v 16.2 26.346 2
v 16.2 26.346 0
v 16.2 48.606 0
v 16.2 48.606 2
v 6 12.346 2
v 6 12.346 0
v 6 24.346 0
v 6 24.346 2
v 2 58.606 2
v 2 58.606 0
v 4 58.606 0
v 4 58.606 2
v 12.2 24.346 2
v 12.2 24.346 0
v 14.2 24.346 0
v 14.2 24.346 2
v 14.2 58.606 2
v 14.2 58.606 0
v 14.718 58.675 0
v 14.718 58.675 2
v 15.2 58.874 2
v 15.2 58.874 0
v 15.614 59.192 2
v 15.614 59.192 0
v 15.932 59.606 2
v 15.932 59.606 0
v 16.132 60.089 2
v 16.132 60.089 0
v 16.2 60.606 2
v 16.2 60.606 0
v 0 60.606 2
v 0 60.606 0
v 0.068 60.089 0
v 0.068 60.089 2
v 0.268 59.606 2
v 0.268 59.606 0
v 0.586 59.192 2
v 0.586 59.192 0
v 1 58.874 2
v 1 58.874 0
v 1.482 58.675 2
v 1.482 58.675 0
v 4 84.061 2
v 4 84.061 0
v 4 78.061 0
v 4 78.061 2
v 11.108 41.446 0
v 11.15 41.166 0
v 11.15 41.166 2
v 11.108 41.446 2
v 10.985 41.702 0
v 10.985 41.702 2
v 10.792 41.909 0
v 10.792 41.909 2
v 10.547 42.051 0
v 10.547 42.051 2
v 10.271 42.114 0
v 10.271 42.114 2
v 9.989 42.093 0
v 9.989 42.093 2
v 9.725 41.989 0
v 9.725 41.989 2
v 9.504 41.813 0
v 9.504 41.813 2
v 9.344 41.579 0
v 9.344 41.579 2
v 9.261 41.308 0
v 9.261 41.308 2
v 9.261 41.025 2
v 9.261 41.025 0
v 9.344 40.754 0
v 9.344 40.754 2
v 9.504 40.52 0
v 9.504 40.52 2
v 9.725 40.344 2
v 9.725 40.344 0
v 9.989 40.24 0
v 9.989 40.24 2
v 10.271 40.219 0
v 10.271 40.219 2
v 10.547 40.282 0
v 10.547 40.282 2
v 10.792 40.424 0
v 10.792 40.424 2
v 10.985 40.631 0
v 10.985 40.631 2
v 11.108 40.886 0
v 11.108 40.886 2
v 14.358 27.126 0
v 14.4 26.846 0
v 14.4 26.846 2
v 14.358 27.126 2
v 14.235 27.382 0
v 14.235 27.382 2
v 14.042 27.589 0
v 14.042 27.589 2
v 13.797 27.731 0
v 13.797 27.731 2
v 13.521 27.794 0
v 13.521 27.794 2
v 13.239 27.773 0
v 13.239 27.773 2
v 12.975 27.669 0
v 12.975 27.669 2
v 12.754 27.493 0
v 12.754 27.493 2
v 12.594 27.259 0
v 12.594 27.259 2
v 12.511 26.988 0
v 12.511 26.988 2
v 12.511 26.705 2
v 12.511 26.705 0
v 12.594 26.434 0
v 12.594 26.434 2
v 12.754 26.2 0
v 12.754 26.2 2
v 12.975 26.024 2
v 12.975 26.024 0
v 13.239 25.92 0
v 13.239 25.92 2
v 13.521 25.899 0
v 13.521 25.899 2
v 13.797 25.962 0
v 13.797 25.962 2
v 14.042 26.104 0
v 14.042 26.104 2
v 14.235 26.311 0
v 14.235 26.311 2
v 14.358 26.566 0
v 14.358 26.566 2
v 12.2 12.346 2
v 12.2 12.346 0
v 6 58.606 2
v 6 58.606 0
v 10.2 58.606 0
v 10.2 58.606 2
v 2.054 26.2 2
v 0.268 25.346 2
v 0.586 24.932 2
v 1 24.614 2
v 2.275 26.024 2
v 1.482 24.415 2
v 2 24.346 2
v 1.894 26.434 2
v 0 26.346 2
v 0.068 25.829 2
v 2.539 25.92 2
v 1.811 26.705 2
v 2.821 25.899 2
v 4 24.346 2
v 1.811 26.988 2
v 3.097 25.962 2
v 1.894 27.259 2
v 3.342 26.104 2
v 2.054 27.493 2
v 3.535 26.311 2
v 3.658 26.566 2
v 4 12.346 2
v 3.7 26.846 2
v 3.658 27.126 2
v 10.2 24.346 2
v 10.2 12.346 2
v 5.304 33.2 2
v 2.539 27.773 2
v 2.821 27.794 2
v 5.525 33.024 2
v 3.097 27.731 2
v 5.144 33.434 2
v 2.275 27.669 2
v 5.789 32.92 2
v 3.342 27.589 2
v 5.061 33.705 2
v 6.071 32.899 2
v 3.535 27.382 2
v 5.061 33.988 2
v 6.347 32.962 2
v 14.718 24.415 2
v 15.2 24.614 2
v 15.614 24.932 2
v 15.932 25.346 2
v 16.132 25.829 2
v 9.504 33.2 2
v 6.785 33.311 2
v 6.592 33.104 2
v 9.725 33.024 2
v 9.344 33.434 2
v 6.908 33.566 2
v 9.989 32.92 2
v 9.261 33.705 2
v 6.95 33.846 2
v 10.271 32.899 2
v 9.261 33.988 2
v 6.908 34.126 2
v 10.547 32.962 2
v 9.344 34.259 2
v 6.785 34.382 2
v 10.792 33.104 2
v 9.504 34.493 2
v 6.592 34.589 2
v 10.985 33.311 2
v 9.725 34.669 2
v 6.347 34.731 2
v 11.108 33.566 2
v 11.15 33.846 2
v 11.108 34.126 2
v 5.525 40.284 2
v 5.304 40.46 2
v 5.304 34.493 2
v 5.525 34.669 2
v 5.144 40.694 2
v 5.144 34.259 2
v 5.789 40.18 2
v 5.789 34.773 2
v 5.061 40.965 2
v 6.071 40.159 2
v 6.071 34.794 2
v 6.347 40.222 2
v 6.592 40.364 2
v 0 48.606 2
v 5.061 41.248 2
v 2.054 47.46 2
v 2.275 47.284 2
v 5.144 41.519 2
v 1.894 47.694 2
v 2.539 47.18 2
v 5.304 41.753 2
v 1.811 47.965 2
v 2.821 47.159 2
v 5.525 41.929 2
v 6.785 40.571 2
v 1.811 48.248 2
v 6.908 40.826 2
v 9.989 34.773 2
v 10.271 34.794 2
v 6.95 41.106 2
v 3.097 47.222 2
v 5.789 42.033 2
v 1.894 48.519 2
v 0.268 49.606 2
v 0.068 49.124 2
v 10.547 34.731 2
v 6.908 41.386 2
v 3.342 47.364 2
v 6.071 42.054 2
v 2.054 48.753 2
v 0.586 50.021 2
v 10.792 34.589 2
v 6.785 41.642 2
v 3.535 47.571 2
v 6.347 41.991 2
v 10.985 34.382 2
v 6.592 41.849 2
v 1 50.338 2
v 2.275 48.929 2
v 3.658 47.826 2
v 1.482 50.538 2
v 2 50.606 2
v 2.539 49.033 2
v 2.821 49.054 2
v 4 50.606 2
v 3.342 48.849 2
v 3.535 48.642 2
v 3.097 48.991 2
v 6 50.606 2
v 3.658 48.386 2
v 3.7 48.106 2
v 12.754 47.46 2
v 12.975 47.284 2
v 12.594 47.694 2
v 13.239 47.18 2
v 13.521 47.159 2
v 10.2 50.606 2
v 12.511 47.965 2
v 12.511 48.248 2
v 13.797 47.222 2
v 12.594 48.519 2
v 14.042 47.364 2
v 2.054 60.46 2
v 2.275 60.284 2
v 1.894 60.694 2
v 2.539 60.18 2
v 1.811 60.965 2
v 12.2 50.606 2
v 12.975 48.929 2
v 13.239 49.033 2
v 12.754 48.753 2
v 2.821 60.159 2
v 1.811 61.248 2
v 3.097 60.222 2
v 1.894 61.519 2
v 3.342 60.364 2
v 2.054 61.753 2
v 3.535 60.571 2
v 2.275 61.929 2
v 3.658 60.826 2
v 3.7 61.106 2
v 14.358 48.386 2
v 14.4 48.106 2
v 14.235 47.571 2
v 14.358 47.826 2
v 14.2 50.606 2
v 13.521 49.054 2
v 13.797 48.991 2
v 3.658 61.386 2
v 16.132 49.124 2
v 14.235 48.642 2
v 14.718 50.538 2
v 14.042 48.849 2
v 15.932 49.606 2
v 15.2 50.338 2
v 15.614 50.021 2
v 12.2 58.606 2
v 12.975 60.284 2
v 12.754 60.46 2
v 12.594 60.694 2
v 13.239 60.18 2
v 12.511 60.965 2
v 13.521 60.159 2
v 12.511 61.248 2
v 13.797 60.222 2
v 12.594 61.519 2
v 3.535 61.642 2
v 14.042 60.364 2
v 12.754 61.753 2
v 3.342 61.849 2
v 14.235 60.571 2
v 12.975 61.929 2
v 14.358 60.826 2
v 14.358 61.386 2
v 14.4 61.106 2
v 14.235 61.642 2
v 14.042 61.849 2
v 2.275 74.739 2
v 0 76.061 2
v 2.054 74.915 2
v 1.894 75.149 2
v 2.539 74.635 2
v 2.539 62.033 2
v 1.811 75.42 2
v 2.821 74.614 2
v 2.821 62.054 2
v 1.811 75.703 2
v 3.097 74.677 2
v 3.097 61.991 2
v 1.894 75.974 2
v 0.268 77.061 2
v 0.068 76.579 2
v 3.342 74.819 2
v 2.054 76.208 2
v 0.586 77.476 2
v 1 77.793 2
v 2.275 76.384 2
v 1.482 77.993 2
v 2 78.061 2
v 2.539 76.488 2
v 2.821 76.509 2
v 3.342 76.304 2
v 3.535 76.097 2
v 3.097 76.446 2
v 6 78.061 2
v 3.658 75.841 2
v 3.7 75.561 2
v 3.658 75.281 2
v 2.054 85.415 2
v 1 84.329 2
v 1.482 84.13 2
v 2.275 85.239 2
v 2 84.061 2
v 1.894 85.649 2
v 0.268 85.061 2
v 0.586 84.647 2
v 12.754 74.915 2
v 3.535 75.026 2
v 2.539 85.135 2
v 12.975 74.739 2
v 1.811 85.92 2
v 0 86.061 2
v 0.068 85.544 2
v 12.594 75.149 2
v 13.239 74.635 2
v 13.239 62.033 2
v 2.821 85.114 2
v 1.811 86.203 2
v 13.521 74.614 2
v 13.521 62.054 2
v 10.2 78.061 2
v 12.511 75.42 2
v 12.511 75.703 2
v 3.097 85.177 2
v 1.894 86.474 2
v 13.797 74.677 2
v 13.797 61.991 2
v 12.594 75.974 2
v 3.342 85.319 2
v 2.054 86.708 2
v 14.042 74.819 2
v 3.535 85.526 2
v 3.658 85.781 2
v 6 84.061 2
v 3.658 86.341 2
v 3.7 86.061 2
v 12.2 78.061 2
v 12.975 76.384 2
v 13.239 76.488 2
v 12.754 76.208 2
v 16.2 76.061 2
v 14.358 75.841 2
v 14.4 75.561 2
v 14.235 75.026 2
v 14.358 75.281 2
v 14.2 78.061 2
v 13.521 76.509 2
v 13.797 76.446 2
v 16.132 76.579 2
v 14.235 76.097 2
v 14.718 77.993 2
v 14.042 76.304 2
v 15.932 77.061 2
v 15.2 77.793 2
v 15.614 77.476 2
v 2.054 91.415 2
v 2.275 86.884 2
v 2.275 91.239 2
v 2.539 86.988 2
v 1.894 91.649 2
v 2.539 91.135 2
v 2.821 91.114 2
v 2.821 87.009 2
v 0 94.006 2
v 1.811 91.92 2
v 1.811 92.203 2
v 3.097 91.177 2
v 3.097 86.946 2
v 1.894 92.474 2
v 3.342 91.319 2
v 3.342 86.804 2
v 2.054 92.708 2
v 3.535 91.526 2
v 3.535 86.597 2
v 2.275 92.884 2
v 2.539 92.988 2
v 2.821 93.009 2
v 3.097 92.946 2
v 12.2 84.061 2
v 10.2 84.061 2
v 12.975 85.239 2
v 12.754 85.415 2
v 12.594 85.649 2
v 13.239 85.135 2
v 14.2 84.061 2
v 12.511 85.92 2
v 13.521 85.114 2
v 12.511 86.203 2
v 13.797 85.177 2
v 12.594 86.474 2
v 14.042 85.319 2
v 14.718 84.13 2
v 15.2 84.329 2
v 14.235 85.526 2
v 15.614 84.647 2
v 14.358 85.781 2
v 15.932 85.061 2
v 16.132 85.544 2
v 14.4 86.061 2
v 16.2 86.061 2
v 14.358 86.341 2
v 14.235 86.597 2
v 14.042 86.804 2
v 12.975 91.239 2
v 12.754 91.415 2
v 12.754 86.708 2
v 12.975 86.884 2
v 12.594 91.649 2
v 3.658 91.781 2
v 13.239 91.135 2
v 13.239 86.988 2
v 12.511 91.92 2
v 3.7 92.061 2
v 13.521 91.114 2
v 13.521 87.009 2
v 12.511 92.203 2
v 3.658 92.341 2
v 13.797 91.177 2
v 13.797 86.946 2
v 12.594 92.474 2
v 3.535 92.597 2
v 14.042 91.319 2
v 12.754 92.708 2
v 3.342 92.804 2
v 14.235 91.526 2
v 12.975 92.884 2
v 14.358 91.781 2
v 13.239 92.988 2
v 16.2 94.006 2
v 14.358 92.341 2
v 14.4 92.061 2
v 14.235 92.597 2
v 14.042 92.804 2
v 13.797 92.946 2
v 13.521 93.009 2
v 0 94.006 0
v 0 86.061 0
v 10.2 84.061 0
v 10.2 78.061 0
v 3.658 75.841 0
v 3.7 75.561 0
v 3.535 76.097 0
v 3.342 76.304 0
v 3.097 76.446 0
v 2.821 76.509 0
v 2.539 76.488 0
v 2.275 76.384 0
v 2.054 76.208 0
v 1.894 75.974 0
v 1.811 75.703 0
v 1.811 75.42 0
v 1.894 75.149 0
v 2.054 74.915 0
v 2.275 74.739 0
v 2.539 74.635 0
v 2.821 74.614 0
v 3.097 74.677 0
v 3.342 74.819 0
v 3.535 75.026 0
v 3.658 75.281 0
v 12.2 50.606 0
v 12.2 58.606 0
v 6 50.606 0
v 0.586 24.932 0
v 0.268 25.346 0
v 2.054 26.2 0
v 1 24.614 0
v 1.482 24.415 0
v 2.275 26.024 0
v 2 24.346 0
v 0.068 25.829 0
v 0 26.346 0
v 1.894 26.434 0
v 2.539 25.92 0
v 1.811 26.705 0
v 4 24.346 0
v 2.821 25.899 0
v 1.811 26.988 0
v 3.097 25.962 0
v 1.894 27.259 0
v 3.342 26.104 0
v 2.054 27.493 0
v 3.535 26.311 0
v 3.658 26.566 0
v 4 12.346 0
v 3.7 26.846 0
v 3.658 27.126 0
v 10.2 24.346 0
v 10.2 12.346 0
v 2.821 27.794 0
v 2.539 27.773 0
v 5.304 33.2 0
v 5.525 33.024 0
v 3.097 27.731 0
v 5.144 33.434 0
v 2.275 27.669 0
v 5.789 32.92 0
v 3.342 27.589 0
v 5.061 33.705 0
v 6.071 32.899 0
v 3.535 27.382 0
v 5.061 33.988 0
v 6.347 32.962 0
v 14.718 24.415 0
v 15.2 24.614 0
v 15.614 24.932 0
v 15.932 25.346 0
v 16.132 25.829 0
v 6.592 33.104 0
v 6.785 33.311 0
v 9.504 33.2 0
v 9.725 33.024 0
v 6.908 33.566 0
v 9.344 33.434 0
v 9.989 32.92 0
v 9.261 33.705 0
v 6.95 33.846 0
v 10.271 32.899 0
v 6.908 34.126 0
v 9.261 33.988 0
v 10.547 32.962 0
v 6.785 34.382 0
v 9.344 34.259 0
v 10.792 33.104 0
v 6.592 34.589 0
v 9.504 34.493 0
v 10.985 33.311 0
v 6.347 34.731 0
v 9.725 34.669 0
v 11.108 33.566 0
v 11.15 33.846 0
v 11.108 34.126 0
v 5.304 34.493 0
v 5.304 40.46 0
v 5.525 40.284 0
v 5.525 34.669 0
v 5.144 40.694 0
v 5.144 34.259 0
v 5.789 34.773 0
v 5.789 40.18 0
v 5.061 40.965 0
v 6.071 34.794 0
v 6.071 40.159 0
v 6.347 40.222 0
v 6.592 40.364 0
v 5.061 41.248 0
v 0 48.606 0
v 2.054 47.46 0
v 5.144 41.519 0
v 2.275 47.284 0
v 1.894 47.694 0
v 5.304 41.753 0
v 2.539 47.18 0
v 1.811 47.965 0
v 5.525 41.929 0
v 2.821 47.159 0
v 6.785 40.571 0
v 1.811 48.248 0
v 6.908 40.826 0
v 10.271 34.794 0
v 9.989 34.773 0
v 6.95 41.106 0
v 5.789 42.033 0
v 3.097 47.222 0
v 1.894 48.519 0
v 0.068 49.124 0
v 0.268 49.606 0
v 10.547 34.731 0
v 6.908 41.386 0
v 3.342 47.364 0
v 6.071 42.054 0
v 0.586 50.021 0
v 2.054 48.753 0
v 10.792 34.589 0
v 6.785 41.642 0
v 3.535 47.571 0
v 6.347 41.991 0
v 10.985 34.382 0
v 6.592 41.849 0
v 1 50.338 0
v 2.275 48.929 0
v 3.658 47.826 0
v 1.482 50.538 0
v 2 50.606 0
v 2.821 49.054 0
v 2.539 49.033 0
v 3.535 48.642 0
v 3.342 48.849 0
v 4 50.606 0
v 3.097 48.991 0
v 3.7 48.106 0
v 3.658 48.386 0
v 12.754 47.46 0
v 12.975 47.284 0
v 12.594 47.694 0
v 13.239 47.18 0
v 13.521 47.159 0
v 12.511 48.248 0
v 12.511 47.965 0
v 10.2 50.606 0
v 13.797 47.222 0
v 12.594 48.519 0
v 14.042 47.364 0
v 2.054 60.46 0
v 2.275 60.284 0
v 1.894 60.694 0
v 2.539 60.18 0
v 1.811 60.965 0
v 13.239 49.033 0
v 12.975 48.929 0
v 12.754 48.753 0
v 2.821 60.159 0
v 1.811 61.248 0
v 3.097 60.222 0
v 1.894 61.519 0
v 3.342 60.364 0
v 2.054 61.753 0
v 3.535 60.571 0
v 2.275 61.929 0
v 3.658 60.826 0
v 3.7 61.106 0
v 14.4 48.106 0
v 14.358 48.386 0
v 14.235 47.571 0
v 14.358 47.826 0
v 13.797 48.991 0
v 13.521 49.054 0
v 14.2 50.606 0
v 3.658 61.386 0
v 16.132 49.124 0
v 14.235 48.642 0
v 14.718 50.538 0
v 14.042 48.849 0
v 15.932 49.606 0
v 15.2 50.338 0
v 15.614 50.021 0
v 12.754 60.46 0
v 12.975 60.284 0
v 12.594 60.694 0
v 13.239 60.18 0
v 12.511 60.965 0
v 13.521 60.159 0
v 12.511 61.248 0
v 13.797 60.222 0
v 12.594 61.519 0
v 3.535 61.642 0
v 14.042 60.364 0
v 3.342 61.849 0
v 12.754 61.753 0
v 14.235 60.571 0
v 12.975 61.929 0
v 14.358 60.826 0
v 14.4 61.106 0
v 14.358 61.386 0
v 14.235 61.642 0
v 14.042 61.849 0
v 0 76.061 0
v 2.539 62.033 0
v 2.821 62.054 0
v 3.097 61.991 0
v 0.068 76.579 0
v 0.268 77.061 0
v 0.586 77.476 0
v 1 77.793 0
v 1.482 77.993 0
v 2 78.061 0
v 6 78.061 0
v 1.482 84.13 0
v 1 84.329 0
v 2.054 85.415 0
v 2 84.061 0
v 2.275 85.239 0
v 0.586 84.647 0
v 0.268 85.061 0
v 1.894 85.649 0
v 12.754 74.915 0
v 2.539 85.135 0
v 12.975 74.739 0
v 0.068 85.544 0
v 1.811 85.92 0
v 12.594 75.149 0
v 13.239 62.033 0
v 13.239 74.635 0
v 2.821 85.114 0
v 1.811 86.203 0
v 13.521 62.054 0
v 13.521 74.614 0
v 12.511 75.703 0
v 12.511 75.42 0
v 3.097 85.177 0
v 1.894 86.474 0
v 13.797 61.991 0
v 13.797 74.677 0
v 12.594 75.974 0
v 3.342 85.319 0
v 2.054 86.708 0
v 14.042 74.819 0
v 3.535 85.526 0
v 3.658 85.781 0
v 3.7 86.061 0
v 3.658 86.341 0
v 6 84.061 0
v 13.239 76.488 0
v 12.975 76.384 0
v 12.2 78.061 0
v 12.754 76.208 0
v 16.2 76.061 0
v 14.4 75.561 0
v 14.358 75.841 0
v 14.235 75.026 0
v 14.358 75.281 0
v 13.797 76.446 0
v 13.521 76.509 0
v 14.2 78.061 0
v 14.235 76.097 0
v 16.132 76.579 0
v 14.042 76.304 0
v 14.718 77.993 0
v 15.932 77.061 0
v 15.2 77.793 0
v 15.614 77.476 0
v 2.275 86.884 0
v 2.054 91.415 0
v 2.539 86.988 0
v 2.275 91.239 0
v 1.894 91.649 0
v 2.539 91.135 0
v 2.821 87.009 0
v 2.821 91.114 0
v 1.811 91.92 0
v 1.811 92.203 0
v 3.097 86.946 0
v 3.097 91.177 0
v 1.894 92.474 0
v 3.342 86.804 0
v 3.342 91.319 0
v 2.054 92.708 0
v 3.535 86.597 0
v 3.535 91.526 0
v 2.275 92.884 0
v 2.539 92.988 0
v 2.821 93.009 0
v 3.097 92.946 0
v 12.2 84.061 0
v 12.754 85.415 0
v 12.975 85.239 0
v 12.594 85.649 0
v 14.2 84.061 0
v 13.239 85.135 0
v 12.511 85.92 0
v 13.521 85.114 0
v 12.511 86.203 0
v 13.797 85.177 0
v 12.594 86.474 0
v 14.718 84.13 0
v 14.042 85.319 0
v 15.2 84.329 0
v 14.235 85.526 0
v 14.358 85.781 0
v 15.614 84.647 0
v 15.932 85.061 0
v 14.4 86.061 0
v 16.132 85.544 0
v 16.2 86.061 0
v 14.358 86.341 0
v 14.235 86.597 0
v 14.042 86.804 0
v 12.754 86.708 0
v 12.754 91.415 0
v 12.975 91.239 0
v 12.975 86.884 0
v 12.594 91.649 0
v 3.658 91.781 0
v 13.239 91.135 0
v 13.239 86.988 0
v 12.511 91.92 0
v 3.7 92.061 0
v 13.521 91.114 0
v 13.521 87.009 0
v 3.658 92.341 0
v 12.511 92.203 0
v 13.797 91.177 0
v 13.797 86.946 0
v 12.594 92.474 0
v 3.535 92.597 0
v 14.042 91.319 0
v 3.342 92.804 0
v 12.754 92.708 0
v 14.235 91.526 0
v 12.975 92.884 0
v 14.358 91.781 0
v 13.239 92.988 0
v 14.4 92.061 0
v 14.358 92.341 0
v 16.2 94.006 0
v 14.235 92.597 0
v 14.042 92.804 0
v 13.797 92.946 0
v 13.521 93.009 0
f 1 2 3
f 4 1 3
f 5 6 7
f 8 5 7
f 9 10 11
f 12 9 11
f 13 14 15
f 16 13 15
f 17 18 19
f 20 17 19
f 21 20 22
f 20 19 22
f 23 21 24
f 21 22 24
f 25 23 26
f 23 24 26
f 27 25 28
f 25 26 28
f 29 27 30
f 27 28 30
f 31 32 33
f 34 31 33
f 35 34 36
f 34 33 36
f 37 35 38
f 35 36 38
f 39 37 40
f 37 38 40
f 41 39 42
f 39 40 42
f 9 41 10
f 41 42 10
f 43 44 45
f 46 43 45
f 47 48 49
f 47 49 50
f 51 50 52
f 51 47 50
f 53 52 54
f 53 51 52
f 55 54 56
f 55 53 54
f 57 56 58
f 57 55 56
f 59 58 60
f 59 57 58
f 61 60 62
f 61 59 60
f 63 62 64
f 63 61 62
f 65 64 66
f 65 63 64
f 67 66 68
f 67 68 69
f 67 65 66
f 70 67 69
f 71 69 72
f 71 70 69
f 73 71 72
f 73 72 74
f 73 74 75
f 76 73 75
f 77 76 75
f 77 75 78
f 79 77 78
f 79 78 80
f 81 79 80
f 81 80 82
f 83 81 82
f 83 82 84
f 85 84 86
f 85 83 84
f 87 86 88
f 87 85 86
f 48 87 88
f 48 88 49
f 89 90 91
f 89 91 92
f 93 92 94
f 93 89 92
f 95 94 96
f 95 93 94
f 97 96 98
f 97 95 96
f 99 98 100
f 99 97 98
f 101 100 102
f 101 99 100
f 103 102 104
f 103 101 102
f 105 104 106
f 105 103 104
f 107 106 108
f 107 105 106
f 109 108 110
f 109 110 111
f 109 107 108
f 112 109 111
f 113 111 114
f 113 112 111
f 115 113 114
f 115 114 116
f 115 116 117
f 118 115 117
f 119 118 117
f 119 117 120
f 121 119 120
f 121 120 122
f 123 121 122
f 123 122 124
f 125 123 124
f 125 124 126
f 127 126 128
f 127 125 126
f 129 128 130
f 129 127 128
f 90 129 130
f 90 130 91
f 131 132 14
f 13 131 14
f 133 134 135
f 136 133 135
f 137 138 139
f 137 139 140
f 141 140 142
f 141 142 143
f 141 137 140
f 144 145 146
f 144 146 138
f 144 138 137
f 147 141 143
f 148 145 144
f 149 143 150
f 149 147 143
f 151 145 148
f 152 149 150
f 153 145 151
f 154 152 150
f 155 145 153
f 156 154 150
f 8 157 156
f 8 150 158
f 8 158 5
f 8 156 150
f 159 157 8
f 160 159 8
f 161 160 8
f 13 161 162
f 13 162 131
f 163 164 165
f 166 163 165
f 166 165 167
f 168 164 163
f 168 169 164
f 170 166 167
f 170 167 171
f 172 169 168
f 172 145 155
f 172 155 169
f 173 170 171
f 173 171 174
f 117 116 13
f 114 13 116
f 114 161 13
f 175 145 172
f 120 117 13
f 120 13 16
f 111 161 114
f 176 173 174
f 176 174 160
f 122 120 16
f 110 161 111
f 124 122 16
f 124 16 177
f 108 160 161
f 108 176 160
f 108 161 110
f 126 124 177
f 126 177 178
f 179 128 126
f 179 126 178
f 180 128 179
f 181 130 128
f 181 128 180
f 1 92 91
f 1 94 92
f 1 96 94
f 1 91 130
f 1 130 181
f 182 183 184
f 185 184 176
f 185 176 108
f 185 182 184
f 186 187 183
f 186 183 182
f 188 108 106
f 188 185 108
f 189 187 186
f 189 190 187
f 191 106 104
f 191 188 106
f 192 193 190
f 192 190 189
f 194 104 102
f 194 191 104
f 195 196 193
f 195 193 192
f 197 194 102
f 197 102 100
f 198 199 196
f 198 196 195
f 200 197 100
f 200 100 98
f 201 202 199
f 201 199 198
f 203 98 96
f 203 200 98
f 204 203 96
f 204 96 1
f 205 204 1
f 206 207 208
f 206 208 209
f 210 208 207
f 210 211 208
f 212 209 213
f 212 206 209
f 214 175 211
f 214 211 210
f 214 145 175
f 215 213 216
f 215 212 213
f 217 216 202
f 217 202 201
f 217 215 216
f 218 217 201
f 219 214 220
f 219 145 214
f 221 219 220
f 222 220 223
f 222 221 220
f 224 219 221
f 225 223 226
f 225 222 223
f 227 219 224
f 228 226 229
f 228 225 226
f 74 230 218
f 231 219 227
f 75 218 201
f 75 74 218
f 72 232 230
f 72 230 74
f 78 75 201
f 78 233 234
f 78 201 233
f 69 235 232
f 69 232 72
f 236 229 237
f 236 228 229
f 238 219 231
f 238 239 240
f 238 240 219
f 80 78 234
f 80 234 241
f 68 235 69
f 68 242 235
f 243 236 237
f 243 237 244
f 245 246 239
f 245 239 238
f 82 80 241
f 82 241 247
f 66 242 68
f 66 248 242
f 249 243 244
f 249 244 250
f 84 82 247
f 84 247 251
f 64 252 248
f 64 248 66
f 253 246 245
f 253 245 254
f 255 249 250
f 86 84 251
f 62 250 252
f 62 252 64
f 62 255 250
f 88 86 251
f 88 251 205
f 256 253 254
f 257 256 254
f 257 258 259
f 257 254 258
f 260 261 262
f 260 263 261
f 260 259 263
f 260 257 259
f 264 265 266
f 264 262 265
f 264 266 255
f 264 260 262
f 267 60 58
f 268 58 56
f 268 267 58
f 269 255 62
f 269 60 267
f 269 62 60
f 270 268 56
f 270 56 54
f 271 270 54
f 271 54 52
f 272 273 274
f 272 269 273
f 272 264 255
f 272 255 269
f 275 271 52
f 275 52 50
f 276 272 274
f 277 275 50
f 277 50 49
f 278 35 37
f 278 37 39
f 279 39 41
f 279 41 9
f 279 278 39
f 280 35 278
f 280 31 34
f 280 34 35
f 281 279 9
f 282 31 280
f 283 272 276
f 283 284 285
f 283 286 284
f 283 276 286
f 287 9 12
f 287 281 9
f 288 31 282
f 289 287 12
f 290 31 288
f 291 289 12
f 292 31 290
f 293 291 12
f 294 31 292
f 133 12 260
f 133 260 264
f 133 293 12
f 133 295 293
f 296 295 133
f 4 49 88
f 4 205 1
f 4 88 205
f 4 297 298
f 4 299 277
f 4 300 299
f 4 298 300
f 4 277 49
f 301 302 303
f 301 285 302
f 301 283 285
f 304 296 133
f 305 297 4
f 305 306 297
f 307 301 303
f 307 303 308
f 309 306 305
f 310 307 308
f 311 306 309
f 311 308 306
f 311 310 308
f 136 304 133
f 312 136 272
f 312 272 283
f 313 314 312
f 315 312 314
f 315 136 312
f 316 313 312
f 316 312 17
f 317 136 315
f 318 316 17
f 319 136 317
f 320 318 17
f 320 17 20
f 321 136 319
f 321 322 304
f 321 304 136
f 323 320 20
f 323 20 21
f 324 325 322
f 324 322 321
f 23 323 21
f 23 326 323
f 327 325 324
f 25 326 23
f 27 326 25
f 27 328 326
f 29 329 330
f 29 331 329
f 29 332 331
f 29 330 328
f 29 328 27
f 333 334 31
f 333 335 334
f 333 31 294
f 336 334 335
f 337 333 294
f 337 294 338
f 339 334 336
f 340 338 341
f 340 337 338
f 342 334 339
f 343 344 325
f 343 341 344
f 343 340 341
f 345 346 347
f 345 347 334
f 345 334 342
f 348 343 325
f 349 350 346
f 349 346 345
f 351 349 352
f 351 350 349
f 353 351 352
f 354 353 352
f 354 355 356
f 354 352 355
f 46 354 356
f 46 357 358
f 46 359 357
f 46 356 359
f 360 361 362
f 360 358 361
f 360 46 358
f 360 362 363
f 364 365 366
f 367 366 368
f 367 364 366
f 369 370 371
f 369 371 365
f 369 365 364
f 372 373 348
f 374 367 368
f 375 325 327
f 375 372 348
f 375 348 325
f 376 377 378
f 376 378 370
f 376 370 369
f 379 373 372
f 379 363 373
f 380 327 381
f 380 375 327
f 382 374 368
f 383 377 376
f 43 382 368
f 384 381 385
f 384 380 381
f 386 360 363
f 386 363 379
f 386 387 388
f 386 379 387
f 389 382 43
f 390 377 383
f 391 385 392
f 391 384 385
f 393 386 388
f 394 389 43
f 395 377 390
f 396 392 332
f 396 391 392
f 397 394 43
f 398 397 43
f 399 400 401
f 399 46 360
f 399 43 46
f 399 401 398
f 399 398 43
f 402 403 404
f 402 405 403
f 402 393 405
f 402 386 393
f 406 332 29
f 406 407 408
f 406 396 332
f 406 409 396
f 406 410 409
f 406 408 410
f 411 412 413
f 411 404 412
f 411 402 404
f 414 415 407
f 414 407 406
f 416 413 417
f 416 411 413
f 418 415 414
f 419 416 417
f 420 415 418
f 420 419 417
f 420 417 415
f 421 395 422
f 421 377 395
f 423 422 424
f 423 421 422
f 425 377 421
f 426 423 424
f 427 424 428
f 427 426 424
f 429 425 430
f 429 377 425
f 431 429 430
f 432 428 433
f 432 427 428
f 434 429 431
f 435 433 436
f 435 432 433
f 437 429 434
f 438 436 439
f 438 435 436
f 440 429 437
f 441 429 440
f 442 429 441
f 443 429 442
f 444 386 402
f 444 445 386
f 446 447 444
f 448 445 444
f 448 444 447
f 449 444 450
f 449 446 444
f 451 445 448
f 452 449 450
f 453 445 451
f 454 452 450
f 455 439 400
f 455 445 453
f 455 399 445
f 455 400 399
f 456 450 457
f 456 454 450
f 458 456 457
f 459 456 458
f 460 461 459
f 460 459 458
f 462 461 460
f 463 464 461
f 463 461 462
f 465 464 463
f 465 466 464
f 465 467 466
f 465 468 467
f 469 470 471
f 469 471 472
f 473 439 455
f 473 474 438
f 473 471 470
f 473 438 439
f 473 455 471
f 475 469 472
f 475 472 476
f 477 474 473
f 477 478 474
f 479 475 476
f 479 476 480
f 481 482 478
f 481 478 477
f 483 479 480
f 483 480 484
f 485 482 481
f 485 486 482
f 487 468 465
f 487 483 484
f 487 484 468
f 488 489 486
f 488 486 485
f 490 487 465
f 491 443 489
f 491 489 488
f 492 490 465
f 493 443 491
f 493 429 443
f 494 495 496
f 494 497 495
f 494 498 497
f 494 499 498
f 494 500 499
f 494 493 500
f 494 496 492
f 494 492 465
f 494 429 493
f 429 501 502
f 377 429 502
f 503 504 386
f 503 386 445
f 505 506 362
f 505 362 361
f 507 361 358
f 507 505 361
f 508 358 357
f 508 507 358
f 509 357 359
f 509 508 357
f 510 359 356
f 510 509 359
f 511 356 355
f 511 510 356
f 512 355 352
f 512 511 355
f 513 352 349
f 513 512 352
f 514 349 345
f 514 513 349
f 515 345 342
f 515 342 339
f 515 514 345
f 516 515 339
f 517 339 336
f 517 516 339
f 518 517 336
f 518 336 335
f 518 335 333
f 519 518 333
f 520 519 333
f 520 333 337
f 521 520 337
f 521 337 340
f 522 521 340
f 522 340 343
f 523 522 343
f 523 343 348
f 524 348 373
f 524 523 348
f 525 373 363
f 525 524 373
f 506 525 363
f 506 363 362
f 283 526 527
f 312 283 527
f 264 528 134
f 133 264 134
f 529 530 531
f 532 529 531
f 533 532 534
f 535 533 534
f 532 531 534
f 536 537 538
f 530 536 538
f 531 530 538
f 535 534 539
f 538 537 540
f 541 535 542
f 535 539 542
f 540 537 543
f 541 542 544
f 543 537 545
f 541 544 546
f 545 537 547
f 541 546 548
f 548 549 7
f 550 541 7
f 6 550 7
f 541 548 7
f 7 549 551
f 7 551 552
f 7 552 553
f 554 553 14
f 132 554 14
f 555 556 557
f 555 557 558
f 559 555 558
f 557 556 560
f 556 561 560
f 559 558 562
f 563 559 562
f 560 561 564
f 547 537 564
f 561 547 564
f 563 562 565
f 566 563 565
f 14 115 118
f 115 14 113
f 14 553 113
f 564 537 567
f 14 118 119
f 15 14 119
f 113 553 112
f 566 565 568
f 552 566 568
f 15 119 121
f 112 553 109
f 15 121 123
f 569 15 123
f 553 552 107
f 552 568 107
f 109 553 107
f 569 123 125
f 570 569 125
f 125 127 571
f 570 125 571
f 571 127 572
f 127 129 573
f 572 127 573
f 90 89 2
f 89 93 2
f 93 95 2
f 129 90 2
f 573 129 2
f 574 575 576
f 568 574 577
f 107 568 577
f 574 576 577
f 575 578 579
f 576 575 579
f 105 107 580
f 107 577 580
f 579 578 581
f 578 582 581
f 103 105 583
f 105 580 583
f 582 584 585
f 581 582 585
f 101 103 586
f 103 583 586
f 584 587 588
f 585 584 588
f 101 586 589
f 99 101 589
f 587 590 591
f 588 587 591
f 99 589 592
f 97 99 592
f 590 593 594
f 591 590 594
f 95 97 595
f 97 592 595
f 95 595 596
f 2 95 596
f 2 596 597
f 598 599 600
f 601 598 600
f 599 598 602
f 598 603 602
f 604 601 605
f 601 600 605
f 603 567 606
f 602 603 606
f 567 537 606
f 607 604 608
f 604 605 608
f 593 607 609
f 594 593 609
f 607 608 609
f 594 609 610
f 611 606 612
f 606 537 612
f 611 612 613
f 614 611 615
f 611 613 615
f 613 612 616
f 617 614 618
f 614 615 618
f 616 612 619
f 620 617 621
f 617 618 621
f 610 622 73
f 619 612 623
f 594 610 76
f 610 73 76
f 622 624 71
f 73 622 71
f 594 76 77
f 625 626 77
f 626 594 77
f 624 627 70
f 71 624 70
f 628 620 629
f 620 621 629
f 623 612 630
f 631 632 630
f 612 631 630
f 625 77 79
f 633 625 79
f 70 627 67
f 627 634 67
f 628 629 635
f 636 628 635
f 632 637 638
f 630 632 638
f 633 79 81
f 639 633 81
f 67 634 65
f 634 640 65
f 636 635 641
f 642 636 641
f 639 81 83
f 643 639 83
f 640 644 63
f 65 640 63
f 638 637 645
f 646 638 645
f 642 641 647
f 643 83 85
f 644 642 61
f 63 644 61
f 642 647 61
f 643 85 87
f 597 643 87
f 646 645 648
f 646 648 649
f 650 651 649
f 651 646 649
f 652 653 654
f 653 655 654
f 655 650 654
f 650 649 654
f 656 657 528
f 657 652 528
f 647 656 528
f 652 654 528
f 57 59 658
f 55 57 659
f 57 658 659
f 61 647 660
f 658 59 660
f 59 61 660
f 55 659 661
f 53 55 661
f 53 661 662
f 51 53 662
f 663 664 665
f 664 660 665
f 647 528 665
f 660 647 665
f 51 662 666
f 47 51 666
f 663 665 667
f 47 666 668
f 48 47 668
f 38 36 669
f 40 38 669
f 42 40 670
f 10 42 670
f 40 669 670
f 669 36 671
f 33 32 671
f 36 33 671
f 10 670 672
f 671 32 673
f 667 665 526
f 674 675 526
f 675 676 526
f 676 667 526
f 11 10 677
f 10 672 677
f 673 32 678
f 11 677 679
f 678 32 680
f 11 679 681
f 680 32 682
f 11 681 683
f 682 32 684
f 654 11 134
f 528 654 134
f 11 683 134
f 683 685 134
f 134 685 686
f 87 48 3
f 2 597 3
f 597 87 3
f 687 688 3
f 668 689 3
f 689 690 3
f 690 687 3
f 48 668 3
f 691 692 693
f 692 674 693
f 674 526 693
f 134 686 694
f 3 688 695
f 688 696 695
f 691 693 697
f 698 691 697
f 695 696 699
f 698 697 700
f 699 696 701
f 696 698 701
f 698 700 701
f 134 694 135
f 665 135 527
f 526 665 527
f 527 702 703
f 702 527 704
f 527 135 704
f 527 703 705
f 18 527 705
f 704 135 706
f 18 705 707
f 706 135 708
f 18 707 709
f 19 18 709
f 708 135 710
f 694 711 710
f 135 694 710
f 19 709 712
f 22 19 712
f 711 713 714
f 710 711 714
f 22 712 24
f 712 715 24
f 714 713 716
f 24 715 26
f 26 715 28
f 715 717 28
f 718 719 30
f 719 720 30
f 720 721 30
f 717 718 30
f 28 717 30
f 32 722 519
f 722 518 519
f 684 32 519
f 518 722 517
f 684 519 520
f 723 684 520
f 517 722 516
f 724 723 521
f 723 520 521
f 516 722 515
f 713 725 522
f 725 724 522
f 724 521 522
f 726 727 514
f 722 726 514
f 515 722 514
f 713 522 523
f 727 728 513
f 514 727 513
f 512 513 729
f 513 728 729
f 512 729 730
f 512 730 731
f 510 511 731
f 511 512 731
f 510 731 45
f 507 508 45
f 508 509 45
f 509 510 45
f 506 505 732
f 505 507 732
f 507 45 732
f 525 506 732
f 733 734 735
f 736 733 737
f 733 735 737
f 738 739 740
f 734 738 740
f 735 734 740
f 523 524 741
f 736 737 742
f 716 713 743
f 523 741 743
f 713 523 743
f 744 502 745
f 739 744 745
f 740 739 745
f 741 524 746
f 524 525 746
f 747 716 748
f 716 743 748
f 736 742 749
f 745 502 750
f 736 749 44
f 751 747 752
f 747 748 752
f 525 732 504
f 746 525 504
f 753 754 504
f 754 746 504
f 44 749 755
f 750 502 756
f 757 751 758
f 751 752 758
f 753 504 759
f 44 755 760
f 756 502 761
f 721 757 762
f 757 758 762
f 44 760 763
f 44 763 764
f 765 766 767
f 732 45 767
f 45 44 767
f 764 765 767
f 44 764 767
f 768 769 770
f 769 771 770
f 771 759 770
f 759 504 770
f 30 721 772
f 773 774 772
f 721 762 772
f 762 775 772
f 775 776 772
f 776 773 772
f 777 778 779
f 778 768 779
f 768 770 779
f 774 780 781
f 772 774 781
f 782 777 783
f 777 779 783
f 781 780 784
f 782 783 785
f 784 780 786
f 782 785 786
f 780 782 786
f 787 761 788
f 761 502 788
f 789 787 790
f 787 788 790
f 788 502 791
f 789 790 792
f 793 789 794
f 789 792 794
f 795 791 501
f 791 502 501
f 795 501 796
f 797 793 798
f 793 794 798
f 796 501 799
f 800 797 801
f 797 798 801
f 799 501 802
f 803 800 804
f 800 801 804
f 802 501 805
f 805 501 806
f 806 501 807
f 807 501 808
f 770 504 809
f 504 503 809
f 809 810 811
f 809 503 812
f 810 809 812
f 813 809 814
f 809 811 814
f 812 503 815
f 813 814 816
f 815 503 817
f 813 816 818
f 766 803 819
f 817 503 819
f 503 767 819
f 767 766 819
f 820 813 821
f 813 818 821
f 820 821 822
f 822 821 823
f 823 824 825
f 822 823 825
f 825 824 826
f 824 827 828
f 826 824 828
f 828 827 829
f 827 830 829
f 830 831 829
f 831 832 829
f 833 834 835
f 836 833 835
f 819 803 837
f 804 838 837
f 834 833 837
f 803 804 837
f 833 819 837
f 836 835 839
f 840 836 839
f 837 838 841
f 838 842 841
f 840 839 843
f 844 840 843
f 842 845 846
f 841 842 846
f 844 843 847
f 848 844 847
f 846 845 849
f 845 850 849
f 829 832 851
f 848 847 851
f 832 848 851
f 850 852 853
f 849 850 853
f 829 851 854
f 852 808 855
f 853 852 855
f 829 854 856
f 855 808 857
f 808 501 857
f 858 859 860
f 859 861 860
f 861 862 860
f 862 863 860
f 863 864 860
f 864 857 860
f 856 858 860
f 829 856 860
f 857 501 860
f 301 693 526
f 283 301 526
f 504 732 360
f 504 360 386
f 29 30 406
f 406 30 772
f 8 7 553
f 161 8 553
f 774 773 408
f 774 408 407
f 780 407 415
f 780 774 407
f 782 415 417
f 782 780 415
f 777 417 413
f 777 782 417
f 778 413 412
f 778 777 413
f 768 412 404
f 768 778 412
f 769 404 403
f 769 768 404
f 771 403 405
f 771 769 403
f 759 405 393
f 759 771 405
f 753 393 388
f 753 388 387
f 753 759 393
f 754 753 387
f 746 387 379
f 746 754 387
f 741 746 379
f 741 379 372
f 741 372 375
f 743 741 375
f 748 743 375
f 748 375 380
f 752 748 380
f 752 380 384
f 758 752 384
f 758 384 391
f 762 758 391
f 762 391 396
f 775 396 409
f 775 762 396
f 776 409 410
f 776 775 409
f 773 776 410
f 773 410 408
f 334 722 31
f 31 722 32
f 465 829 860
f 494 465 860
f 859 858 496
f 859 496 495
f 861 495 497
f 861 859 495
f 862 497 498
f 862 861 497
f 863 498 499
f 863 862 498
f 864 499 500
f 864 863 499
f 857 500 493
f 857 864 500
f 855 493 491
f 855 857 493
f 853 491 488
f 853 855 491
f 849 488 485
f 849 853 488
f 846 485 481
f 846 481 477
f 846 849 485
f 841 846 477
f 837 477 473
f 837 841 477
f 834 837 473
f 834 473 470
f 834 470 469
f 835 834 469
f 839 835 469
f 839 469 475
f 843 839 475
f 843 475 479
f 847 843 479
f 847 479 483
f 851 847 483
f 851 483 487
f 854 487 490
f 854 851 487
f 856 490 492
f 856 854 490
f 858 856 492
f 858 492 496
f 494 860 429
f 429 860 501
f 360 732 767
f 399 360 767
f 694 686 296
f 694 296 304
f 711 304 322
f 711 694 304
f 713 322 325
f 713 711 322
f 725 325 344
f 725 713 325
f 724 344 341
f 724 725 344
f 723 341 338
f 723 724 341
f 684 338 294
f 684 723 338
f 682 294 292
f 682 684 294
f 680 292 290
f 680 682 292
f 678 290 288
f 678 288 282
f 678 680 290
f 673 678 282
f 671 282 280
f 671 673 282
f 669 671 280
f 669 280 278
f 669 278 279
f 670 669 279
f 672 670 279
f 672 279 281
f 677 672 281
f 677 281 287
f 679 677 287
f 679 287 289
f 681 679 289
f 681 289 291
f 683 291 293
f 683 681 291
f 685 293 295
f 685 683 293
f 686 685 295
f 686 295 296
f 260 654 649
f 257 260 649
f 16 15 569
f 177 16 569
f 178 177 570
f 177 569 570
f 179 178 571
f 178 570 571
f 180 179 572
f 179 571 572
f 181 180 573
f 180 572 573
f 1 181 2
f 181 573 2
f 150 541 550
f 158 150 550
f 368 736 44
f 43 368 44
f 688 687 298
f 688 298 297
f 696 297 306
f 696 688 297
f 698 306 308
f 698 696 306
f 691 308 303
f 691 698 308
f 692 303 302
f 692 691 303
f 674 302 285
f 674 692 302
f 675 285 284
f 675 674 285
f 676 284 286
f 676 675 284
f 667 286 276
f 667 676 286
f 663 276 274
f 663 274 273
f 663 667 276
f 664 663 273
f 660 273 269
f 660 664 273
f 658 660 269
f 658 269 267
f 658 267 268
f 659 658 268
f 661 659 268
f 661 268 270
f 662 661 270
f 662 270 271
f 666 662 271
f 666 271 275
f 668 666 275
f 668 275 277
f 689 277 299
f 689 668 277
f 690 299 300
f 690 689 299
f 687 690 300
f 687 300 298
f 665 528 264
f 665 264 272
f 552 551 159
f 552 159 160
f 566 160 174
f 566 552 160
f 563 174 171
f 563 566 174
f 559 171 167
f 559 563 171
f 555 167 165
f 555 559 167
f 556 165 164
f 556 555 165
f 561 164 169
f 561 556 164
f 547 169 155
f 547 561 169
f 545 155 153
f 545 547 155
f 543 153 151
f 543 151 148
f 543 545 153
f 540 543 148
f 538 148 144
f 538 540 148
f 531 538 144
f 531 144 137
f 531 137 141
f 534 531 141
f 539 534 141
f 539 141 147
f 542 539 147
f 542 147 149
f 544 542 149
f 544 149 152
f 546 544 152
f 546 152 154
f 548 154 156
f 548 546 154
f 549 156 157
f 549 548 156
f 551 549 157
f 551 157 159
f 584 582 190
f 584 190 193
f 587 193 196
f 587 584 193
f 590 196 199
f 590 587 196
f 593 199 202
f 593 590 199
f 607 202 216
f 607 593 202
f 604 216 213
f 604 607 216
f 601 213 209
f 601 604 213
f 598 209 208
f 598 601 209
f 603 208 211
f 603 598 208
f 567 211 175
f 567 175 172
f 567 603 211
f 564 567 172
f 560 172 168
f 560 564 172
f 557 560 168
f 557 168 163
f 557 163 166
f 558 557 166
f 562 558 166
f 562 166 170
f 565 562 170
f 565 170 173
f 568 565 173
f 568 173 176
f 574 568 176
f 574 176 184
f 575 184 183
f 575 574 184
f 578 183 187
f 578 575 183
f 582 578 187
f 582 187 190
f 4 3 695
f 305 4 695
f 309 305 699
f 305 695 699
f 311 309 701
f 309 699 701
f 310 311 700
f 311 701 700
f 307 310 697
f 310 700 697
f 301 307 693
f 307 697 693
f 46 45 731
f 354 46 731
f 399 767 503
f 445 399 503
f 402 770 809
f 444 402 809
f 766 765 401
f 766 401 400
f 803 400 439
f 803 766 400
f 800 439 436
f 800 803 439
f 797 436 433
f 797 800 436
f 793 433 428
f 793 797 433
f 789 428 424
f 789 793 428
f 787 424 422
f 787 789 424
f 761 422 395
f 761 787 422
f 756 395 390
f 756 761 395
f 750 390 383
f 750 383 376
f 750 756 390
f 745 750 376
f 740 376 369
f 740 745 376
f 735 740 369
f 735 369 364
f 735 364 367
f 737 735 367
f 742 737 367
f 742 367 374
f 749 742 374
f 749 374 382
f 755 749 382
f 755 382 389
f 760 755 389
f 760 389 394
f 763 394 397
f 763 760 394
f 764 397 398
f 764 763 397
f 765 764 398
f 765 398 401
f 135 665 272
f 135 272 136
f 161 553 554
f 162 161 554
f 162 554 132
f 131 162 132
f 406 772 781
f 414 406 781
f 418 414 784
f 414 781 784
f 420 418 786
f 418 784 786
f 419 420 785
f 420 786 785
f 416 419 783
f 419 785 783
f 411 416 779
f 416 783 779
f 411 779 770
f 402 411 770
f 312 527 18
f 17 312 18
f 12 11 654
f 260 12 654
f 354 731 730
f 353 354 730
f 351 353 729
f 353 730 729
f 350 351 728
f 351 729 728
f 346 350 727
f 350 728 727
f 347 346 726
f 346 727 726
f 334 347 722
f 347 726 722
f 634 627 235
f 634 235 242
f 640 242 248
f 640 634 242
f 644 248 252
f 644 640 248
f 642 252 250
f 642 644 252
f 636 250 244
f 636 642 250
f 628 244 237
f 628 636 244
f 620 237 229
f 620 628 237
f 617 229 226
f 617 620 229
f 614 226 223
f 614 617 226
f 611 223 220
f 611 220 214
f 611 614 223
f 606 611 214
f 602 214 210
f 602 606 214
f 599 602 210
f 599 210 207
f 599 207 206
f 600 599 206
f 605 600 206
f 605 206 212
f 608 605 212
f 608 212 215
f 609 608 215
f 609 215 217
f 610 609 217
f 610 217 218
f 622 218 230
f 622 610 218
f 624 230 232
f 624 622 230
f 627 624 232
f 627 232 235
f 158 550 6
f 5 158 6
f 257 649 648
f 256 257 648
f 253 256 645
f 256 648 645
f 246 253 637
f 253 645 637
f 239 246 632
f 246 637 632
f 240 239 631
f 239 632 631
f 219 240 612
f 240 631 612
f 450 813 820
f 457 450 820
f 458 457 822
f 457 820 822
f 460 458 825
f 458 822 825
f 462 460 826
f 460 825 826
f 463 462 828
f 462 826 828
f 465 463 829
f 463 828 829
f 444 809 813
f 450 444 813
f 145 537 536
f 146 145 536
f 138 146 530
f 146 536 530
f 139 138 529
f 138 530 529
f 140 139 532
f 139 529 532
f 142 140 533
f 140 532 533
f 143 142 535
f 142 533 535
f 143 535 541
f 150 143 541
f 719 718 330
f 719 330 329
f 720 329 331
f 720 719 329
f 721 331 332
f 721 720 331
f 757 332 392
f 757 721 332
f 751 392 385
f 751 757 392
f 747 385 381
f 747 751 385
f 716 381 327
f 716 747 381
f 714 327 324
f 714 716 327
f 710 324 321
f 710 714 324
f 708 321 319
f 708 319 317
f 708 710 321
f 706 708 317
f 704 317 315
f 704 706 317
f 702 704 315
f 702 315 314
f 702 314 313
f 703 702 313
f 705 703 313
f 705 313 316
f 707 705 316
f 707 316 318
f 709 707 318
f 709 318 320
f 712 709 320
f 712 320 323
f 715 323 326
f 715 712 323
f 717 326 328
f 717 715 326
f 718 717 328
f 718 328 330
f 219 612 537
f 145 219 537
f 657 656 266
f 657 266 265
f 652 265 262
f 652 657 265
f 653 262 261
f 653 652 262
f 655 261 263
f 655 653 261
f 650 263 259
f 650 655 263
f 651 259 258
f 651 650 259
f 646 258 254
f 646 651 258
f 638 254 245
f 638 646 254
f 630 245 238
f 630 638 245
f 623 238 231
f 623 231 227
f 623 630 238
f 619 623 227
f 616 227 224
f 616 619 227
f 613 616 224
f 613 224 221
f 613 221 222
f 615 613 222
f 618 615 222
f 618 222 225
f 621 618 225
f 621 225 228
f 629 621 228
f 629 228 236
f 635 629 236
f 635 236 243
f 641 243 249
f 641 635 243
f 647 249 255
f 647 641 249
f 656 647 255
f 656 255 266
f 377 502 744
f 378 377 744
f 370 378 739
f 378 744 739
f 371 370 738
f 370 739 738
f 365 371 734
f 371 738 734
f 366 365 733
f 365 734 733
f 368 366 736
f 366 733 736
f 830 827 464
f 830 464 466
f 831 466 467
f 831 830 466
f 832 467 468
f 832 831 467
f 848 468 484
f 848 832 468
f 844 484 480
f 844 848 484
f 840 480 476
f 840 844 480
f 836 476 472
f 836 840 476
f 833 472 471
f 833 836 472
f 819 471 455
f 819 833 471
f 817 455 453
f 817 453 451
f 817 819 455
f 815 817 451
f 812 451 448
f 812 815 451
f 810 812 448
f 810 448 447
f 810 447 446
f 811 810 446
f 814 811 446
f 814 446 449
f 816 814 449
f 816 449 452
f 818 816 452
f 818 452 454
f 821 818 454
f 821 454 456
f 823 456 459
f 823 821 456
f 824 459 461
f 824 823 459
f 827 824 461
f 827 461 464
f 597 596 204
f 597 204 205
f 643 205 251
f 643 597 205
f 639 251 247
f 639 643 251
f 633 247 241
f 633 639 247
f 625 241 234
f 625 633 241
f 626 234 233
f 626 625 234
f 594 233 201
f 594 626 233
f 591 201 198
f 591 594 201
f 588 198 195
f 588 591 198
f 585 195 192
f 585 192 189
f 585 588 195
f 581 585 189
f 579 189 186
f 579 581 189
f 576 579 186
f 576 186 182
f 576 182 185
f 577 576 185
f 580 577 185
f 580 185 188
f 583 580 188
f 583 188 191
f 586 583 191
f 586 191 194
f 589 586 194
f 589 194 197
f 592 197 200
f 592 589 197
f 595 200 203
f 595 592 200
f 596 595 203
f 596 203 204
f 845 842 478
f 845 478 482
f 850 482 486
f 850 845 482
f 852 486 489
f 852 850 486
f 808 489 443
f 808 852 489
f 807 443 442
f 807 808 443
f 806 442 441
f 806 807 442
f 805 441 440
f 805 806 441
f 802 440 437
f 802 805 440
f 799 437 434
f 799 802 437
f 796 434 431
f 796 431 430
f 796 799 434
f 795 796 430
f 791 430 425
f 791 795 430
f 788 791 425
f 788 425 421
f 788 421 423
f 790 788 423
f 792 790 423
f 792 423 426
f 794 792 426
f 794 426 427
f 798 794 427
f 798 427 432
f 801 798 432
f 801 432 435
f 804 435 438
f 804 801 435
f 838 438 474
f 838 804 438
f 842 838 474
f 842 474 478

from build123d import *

# Parameters (mm, degrees)
SKETCH3_R           = 0.95
SKETCH3_W           = 4.2
SKETCH3_H           = 8
SKETCH3_H_2         = 6
BOSS_EXTRUDE3_DEPTH = 2


with BuildPart() as part:
    # Sketch3 → Boss-Extrude3 (new body)
    with BuildSketch(Plane.XY):
        with BuildLine():
            Line((0, 94.006448831), (0, 86.061448831))
            ThreePointArc((0, 86.061448831), (0.585786438, 84.647235269), (2, 84.061448831))
            Line((2, 84.061448831), (4, 84.061448831))
            Line((4, 84.061448831), (4, 78.061448831))
            Line((4, 78.061448831), (2, 78.061448831))
            ThreePointArc((2, 78.061448831), (0.585786438, 77.475662393), (0, 76.061448831))
            Line((0, 76.061448831), (0, 60.606448831))
            ThreePointArc((0, 60.606448831), (0.585786438, 59.192235269), (2, 58.606448831))
            Line((2, 58.606448831), (4, 58.606448831))
            Line((4, 58.606448831), (4, 50.606448831))
            Line((4, 50.606448831), (2, 50.606448831))
            ThreePointArc((2, 50.606448831), (0.585786438, 50.020662393), (0, 48.606448831))
            Line((0, 48.606448831), (0, 26.346448831))
            ThreePointArc((0, 26.346448831), (0.585786438, 24.932235269), (2, 24.346448831))
            Line((2, 24.346448831), (4, 24.346448831))
            Line((4, 24.346448831), (4, 12.346448831))
            Line((4, 12.346448831), (6, 12.346448831))
            Line((6, 12.346448831), (6, 24.346448831))
            Line((6, 24.346448831), (10.2, 24.346448831))
            Line((10.2, 24.346448831), (10.2, 12.346448831))
            Line((10.2, 12.346448831), (12.2, 12.346448831))
            Line((12.2, 12.346448831), (12.2, 24.346448831))
            Line((12.2, 24.346448831), (14.2, 24.346448831))
            ThreePointArc((14.2, 24.346448831), (15.614213562, 24.932235269), (16.2, 26.346448831))
            Line((16.2, 26.346448831), (16.2, 48.606448831))
            ThreePointArc((16.2, 48.606448831), (15.614213562, 50.020662393), (14.2, 50.606448831))
            Line((14.2, 50.606448831), (12.2, 50.606448831))
            Line((12.2, 50.606448831), (12.2, 58.606448831))
            Line((12.2, 58.606448831), (14.2, 58.606448831))
            ThreePointArc((14.2, 58.606448831), (15.614213562, 59.192235269), (16.2, 60.606448831))
            Line((16.2, 60.606448831), (16.2, 76.061448831))
            ThreePointArc((16.2, 76.061448831), (15.614213562, 77.475662393), (14.2, 78.061448831))
            Line((14.2, 78.061448831), (12.2, 78.061448831))
            Line((12.2, 78.061448831), (12.2, 84.061448831))
            Line((12.2, 84.061448831), (14.2, 84.061448831))
            ThreePointArc((14.2, 84.061448831), (15.614213562, 84.647235269), (16.2, 86.061448831))
            Line((16.2, 86.061448831), (16.2, 94.006448831))
            Line((16.2, 94.006448831), (0, 94.006448831))
        make_face()
        with Locations((6, 33.846448831)):
            Circle(SKETCH3_R, mode=Mode.SUBTRACT)
        with Locations((10.2, 33.846448831)):
            Circle(SKETCH3_R, mode=Mode.SUBTRACT)
        with Locations((2.75, 86.061448831)):
            Circle(SKETCH3_R, mode=Mode.SUBTRACT)
        with Locations((10.2, 41.166448831)):
            Circle(SKETCH3_R, mode=Mode.SUBTRACT)
        with Locations((13.45, 48.106448831)):
            Circle(SKETCH3_R, mode=Mode.SUBTRACT)
        with Locations((2.75, 92.061448831)):
            Circle(SKETCH3_R, mode=Mode.SUBTRACT)
        with Locations((13.45, 86.061448831)):
            Circle(SKETCH3_R, mode=Mode.SUBTRACT)
        with Locations((2.75, 61.106448831)):
            Circle(SKETCH3_R, mode=Mode.SUBTRACT)
        with Locations((13.45, 61.106448831)):
            Circle(SKETCH3_R, mode=Mode.SUBTRACT)
        with Locations((2.75, 75.561448831)):
            Circle(SKETCH3_R, mode=Mode.SUBTRACT)
        with Locations((13.45, 26.846448831)):
            Circle(SKETCH3_R, mode=Mode.SUBTRACT)
        with Locations((13.45, 75.561448831)):
            Circle(SKETCH3_R, mode=Mode.SUBTRACT)
        with Locations((13.45, 92.061448831)):
            Circle(SKETCH3_R, mode=Mode.SUBTRACT)
        with Locations((2.75, 26.846448831)):
            Circle(SKETCH3_R, mode=Mode.SUBTRACT)
        with Locations((6, 41.106448831)):
            Circle(SKETCH3_R, mode=Mode.SUBTRACT)
        with Locations((2.75, 48.106448831)):
            Circle(SKETCH3_R, mode=Mode.SUBTRACT)
        with Locations((8.1, 54.606448831)):
            Rectangle(SKETCH3_W, SKETCH3_H, mode=Mode.SUBTRACT)
        with Locations((8.1, 81.061448831)):
            Rectangle(SKETCH3_W, SKETCH3_H_2, mode=Mode.SUBTRACT)
    extrude(amount=BOSS_EXTRUDE3_DEPTH)


solid = part.part
